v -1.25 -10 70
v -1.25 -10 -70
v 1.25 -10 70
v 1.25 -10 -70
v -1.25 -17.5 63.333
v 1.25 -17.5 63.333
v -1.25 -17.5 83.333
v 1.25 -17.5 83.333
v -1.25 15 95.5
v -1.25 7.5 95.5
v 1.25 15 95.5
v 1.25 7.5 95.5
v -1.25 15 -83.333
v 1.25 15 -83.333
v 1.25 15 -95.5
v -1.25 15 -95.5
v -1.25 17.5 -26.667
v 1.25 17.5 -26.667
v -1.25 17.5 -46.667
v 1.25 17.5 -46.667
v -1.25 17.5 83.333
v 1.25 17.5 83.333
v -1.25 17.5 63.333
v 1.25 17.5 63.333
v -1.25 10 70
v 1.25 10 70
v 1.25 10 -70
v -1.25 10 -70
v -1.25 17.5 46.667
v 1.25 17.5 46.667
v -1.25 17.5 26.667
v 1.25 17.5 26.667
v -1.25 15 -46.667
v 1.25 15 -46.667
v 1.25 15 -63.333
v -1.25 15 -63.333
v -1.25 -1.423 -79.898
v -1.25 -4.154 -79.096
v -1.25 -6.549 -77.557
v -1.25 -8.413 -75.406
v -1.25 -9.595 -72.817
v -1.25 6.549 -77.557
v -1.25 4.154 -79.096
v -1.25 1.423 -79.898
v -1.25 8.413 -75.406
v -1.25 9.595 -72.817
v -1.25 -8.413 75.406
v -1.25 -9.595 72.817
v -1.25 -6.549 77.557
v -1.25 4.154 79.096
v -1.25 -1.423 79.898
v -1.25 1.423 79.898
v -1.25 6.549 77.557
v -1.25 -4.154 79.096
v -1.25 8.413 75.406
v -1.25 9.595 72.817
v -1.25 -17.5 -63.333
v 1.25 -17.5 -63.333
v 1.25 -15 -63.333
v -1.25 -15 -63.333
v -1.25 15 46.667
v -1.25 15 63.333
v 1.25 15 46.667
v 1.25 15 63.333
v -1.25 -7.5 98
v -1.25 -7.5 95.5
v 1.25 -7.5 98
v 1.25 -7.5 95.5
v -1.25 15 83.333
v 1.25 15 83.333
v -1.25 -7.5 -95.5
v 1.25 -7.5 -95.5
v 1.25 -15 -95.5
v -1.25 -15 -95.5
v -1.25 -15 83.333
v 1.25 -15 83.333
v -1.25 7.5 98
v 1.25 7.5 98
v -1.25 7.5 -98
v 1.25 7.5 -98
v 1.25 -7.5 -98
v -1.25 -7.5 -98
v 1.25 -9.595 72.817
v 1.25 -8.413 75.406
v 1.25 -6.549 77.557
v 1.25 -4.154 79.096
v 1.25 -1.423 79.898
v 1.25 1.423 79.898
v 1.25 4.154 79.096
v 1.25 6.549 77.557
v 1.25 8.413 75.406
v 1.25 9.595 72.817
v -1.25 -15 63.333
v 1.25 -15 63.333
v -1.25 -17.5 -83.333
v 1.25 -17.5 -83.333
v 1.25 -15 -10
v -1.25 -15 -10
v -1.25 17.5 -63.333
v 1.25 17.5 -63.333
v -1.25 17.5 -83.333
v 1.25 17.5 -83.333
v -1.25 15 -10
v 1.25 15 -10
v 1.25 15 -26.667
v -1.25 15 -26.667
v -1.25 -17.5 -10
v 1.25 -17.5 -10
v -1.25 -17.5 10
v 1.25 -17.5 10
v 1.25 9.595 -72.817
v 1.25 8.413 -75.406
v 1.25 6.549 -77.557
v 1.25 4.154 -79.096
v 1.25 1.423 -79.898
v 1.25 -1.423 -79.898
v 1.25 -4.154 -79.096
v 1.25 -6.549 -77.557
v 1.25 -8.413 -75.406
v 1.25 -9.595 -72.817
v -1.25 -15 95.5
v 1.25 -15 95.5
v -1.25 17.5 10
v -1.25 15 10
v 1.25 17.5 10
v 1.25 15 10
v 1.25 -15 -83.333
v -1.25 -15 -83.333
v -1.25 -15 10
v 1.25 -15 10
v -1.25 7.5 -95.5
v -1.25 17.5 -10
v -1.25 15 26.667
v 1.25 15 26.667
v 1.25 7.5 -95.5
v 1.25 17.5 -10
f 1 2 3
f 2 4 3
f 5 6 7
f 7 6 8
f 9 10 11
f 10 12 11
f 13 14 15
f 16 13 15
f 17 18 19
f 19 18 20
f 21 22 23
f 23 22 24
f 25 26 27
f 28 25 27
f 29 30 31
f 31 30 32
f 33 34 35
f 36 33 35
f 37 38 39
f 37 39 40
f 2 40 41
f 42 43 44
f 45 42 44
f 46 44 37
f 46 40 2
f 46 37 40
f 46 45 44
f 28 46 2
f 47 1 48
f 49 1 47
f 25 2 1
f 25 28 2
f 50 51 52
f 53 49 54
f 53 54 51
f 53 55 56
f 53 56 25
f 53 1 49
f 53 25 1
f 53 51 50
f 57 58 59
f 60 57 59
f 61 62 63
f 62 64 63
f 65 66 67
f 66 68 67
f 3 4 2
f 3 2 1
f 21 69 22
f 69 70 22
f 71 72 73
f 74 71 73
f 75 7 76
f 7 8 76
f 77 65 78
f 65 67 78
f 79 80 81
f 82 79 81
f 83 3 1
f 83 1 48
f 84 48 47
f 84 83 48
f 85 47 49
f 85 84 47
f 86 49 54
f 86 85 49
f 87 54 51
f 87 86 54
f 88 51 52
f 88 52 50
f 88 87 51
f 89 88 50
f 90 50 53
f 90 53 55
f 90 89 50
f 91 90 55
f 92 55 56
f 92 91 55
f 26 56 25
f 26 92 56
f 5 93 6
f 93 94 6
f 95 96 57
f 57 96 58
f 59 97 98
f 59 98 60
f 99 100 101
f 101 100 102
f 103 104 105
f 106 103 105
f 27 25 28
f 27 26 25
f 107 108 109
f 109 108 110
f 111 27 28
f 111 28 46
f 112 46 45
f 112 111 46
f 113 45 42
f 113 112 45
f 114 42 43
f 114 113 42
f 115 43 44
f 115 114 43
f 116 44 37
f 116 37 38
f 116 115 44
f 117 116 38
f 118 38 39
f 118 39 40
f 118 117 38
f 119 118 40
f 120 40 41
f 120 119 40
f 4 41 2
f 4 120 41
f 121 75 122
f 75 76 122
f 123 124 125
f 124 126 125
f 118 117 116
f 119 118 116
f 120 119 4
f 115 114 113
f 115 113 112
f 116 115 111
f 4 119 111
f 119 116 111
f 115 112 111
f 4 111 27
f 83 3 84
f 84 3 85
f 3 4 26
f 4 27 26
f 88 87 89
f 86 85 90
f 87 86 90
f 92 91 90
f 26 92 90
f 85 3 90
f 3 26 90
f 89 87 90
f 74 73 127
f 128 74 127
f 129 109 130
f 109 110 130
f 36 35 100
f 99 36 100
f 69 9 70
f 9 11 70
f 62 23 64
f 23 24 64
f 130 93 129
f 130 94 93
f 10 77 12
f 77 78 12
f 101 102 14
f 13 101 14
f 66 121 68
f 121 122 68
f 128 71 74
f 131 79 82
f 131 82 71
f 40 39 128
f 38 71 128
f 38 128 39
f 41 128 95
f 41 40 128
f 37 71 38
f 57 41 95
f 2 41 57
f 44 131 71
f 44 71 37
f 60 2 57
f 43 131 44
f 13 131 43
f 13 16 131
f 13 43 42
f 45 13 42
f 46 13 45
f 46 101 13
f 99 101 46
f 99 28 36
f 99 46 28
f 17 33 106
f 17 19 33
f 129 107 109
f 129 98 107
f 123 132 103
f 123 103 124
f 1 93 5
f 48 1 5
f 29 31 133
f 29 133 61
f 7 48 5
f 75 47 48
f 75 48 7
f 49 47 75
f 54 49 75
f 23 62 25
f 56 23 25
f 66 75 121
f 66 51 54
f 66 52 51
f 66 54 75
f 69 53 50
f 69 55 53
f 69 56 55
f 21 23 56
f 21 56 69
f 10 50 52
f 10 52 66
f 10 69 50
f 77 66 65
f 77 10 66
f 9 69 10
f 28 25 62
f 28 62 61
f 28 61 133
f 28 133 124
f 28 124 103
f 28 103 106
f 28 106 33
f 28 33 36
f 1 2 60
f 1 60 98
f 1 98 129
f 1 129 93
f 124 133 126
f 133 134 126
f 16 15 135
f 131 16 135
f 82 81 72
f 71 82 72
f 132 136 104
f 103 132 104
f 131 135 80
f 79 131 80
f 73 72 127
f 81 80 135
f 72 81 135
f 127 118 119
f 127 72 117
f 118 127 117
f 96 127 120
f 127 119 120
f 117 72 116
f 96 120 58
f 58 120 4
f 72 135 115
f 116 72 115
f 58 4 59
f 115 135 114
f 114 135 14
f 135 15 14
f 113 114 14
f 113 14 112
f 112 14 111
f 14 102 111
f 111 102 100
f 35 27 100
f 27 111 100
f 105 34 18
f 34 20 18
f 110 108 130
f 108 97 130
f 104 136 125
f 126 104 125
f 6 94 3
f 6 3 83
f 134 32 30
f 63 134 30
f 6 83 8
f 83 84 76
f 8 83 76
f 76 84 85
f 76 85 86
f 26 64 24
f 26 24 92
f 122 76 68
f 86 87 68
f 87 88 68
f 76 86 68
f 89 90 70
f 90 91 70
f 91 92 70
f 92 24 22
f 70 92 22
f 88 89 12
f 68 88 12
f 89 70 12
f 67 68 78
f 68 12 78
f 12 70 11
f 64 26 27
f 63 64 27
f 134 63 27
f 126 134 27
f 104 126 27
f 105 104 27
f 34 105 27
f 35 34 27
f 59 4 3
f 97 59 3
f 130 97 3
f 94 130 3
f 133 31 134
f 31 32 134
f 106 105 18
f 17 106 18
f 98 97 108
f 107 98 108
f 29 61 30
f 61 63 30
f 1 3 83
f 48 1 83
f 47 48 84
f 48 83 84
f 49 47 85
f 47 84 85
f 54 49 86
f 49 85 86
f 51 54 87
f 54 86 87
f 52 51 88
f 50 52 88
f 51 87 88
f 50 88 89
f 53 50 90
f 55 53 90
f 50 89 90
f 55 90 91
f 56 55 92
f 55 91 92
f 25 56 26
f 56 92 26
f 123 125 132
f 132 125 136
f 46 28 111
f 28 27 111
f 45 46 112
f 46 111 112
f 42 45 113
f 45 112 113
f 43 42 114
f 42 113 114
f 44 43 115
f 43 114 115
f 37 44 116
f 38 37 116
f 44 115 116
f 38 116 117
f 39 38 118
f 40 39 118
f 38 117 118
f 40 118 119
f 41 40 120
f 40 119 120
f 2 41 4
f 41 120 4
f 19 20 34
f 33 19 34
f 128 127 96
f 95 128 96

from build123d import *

# Parameters (mm, degrees)
BOSS_EXTRUDE1_DEPTH = 1.25
BOSS_EXTRUDE2_DEPTH = 1.25


with BuildPart() as part:
    # Sketch1 → Boss-Extrude1 (new, symmetric)
    with BuildSketch(Plane(origin=(0, 0, 0), x_dir=(0, 0, -1), z_dir=(1, 0, 0))):
        Polygon((-10, -17.5), (10, -17.5), (10, -15), (26.666666667, -15), (46.666666667, -15), (63.333333333, -15), (63.333333333, -17.5), (83.333333333, -17.5), (83.333333333, -15), (95.5, -15), (95.5, -7.5), (98, -7.5), (98, 7.5), (95.5, 7.5), (95.5, 15), (83.333333333, 15), (83.333333333, 17.5), (63.333333333, 17.5), (63.333333333, 15), (46.666666667, 15), (46.666666667, 17.5), (26.666666667, 17.5), (26.666666667, 15), (10, 15), (10, 17.5), (-10, 17.5), (-10, 15), (-26.666666667, 15), (-26.666666667, 17.5), (-46.666666667, 17.5), (-46.666666667, 15), (-63.333333333, 15), (-63.333333333, 17.5), (-83.333333333, 17.5), (-83.333333333, 15), (-95.5, 15), (-95.5, 7.5), (-98, 7.5), (-98, -7.5), (-95.5, -7.5), (-95.5, -15), (-83.333333333, -15), (-83.333333333, -17.5), (-63.333333333, -17.5), (-63.333333333, -15), (-46.666666667, -15), (-26.666666667, -15), (-10, -15), align=None)
        with BuildLine():
            ThreePointArc((-70, -10), (-80, 0), (-70, 10))
            Line((-70, 10), (70, 10))
            ThreePointArc((70, 10), (80, 0), (70, -10))
            Line((70, -10), (-70, -10))
        make_face(mode=Mode.SUBTRACT)
    extrude(amount=BOSS_EXTRUDE1_DEPTH, both=True)


with BuildPart() as body_2:
    # Sketch1<6> → Boss-Extrude2 (new, symmetric)
    with BuildSketch(Plane(origin=(0, 0, 0), x_dir=(0, 0, -1), z_dir=(1, 0, 0))):
        with BuildLine():
            Line((70, 10), (-70, 10))
            ThreePointArc((-70, 10), (-80, 0), (-70, -10))
            Line((-70, -10), (70, -10))
            ThreePointArc((70, -10), (80, 0), (70, 10))
        make_face()
    extrude(amount=BOSS_EXTRUDE2_DEPTH, both=True)


solid = Compound([part.part, body_2.part])
